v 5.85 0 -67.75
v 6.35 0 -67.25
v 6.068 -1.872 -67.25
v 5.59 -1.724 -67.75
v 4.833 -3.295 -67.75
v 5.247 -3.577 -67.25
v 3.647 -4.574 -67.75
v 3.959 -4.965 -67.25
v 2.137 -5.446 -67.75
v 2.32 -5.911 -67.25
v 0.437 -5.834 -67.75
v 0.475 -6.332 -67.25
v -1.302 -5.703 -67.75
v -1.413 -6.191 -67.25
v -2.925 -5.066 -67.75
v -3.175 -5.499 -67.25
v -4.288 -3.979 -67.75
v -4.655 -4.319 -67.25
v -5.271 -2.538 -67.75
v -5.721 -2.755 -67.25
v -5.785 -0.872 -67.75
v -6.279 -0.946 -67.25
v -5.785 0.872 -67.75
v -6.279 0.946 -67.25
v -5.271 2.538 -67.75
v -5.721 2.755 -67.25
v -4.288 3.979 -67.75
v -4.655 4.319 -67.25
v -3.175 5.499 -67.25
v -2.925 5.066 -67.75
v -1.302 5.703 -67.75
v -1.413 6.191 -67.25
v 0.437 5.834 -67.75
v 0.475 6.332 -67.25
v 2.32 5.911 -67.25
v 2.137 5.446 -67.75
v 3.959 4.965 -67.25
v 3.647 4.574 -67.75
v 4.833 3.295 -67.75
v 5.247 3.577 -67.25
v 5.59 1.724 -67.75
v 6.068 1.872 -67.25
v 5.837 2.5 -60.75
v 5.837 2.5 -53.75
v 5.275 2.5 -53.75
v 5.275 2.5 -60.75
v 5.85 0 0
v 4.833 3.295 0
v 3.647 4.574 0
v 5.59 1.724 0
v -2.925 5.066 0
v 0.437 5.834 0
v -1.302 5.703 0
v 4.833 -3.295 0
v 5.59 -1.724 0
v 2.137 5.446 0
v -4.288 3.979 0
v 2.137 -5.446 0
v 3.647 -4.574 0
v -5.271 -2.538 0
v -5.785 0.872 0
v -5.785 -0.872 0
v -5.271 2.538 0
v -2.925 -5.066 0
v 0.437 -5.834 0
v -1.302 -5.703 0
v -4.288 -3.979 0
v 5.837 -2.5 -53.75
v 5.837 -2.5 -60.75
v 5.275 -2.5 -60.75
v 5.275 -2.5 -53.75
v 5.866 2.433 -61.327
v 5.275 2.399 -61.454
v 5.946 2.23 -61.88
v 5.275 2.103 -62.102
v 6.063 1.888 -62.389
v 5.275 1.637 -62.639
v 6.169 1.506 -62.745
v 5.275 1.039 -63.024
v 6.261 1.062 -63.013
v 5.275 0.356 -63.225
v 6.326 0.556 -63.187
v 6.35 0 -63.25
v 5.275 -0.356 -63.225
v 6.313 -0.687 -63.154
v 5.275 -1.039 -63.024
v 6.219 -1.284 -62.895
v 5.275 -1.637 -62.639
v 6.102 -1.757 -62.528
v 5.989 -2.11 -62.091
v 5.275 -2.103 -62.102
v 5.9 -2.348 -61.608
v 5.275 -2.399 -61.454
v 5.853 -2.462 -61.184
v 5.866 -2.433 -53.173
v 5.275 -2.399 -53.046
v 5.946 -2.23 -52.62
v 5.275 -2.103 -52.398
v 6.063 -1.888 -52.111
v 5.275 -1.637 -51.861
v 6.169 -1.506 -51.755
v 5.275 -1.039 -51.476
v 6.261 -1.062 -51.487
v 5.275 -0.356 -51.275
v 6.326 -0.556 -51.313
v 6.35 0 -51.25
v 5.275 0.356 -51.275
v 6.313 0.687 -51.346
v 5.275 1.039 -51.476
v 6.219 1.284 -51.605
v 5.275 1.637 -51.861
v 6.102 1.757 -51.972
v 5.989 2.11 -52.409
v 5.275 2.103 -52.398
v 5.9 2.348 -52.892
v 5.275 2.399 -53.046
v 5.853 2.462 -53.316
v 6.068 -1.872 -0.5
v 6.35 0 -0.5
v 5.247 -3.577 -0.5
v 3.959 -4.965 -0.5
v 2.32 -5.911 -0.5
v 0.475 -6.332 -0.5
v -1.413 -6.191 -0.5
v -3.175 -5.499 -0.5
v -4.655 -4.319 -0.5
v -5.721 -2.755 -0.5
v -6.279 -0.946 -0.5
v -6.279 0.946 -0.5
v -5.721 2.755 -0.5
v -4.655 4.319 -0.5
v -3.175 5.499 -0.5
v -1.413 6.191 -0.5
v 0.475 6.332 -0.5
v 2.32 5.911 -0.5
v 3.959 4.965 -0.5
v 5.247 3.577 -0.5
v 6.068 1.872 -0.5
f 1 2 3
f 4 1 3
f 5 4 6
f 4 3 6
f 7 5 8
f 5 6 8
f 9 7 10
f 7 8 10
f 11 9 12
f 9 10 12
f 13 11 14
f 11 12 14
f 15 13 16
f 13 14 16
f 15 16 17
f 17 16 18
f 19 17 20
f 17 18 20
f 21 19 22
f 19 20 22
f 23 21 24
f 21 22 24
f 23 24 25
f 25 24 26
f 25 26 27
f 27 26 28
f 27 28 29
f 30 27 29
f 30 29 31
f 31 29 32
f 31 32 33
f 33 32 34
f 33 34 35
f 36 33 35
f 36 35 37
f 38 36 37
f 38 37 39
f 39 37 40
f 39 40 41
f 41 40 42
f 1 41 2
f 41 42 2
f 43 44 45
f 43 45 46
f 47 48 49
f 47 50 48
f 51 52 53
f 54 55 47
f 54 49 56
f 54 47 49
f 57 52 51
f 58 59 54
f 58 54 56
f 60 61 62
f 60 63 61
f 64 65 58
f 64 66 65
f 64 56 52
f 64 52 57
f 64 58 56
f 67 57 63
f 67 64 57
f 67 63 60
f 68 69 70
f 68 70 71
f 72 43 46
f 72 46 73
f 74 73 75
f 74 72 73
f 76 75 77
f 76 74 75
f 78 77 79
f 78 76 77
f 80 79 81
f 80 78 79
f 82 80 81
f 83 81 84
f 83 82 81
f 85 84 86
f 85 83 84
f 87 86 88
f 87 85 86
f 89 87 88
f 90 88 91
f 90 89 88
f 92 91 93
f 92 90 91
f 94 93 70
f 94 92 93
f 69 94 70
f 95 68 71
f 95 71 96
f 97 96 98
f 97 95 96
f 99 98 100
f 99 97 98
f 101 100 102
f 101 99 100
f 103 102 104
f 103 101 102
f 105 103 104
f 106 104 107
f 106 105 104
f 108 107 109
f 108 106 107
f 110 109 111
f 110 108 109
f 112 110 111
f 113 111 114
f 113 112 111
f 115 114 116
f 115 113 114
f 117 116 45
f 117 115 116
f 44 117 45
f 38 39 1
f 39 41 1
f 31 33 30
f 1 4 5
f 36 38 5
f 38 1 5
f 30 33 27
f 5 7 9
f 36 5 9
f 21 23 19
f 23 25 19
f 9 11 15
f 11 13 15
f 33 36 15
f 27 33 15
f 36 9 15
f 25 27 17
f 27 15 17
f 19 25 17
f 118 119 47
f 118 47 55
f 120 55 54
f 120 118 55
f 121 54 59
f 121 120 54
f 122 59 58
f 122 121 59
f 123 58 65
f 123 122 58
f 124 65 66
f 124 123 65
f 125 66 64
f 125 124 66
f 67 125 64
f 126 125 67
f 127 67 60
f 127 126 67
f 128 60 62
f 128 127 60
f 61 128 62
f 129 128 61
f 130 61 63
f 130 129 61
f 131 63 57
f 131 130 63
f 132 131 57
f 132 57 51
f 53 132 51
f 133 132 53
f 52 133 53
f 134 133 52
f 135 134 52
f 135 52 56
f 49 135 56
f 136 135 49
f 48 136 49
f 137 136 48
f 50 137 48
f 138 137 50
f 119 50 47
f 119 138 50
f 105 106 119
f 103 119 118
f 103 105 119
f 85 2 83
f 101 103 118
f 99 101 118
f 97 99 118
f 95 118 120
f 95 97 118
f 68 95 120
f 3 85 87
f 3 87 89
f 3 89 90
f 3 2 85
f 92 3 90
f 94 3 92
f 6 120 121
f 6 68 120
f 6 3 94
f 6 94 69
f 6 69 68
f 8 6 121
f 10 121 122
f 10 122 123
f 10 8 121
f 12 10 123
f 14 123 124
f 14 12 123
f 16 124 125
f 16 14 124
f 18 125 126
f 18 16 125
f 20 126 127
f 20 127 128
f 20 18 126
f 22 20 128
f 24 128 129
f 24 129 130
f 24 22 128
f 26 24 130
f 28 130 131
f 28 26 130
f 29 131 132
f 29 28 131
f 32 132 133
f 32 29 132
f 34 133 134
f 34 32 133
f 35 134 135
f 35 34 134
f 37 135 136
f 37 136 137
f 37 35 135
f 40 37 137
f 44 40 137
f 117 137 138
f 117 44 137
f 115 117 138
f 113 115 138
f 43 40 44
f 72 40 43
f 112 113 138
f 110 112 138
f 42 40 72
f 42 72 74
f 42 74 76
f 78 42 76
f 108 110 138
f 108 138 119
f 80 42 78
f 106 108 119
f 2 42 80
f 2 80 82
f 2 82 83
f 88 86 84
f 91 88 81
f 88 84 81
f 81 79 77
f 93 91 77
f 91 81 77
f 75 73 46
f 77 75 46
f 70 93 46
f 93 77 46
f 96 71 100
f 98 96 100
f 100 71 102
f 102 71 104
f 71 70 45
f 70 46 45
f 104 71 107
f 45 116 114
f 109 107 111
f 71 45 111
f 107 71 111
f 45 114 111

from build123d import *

# Parameters (mm, degrees)
SKETCH_1_W          = 67.75
SKETCH_1_H          = 6.35
CHAMFER_1_SIZE      = 0.5
CUT_EXTRUDE_1_DEPTH = 1.075


with BuildPart() as part:
    # Эскиз1 → Повернуть1 (revolve)
    with BuildSketch(Plane(origin=(0, 0, 0), x_dir=(0, 0, -1), z_dir=(1, 0, 0)), mode=Mode.PRIVATE) as revolve_1_sk:
        with Locations((33.875, 3.175)):
            Rectangle(SKETCH_1_W, SKETCH_1_H)
    revolve(revolve_1_sk.sketch.rotate(Axis((0, 0, 0), (0, 0, -1)), 90), axis=Axis((0, 0, 0), (0, 0, -1)))

    # Фаска1
    chamfer_1_edges = [part.edges().sort_by_distance(p)[0] for p in [
        (-6.35, 0, 0),
        (-6.35, 0, -67.75),
    ]]
    chamfer(chamfer_1_edges, length=CHAMFER_1_SIZE)

    # Эскиз2 → Вырез-Вытянуть1 (cut)
    with BuildSketch(Plane(origin=(6.35, 0, 0), x_dir=(0, 0, -1), z_dir=(1, 0, 0))):
        with BuildLine():
            Line((53.75, 2.5), (60.75, 2.5))
            ThreePointArc((60.75, 2.5), (63.25, 0), (60.75, -2.5))
            Line((60.75, -2.5), (53.75, -2.5))
            ThreePointArc((53.75, -2.5), (51.25, 0), (53.75, 2.5))
        make_face()
    extrude(amount=-CUT_EXTRUDE_1_DEPTH, mode=Mode.SUBTRACT)


solid = part.part
